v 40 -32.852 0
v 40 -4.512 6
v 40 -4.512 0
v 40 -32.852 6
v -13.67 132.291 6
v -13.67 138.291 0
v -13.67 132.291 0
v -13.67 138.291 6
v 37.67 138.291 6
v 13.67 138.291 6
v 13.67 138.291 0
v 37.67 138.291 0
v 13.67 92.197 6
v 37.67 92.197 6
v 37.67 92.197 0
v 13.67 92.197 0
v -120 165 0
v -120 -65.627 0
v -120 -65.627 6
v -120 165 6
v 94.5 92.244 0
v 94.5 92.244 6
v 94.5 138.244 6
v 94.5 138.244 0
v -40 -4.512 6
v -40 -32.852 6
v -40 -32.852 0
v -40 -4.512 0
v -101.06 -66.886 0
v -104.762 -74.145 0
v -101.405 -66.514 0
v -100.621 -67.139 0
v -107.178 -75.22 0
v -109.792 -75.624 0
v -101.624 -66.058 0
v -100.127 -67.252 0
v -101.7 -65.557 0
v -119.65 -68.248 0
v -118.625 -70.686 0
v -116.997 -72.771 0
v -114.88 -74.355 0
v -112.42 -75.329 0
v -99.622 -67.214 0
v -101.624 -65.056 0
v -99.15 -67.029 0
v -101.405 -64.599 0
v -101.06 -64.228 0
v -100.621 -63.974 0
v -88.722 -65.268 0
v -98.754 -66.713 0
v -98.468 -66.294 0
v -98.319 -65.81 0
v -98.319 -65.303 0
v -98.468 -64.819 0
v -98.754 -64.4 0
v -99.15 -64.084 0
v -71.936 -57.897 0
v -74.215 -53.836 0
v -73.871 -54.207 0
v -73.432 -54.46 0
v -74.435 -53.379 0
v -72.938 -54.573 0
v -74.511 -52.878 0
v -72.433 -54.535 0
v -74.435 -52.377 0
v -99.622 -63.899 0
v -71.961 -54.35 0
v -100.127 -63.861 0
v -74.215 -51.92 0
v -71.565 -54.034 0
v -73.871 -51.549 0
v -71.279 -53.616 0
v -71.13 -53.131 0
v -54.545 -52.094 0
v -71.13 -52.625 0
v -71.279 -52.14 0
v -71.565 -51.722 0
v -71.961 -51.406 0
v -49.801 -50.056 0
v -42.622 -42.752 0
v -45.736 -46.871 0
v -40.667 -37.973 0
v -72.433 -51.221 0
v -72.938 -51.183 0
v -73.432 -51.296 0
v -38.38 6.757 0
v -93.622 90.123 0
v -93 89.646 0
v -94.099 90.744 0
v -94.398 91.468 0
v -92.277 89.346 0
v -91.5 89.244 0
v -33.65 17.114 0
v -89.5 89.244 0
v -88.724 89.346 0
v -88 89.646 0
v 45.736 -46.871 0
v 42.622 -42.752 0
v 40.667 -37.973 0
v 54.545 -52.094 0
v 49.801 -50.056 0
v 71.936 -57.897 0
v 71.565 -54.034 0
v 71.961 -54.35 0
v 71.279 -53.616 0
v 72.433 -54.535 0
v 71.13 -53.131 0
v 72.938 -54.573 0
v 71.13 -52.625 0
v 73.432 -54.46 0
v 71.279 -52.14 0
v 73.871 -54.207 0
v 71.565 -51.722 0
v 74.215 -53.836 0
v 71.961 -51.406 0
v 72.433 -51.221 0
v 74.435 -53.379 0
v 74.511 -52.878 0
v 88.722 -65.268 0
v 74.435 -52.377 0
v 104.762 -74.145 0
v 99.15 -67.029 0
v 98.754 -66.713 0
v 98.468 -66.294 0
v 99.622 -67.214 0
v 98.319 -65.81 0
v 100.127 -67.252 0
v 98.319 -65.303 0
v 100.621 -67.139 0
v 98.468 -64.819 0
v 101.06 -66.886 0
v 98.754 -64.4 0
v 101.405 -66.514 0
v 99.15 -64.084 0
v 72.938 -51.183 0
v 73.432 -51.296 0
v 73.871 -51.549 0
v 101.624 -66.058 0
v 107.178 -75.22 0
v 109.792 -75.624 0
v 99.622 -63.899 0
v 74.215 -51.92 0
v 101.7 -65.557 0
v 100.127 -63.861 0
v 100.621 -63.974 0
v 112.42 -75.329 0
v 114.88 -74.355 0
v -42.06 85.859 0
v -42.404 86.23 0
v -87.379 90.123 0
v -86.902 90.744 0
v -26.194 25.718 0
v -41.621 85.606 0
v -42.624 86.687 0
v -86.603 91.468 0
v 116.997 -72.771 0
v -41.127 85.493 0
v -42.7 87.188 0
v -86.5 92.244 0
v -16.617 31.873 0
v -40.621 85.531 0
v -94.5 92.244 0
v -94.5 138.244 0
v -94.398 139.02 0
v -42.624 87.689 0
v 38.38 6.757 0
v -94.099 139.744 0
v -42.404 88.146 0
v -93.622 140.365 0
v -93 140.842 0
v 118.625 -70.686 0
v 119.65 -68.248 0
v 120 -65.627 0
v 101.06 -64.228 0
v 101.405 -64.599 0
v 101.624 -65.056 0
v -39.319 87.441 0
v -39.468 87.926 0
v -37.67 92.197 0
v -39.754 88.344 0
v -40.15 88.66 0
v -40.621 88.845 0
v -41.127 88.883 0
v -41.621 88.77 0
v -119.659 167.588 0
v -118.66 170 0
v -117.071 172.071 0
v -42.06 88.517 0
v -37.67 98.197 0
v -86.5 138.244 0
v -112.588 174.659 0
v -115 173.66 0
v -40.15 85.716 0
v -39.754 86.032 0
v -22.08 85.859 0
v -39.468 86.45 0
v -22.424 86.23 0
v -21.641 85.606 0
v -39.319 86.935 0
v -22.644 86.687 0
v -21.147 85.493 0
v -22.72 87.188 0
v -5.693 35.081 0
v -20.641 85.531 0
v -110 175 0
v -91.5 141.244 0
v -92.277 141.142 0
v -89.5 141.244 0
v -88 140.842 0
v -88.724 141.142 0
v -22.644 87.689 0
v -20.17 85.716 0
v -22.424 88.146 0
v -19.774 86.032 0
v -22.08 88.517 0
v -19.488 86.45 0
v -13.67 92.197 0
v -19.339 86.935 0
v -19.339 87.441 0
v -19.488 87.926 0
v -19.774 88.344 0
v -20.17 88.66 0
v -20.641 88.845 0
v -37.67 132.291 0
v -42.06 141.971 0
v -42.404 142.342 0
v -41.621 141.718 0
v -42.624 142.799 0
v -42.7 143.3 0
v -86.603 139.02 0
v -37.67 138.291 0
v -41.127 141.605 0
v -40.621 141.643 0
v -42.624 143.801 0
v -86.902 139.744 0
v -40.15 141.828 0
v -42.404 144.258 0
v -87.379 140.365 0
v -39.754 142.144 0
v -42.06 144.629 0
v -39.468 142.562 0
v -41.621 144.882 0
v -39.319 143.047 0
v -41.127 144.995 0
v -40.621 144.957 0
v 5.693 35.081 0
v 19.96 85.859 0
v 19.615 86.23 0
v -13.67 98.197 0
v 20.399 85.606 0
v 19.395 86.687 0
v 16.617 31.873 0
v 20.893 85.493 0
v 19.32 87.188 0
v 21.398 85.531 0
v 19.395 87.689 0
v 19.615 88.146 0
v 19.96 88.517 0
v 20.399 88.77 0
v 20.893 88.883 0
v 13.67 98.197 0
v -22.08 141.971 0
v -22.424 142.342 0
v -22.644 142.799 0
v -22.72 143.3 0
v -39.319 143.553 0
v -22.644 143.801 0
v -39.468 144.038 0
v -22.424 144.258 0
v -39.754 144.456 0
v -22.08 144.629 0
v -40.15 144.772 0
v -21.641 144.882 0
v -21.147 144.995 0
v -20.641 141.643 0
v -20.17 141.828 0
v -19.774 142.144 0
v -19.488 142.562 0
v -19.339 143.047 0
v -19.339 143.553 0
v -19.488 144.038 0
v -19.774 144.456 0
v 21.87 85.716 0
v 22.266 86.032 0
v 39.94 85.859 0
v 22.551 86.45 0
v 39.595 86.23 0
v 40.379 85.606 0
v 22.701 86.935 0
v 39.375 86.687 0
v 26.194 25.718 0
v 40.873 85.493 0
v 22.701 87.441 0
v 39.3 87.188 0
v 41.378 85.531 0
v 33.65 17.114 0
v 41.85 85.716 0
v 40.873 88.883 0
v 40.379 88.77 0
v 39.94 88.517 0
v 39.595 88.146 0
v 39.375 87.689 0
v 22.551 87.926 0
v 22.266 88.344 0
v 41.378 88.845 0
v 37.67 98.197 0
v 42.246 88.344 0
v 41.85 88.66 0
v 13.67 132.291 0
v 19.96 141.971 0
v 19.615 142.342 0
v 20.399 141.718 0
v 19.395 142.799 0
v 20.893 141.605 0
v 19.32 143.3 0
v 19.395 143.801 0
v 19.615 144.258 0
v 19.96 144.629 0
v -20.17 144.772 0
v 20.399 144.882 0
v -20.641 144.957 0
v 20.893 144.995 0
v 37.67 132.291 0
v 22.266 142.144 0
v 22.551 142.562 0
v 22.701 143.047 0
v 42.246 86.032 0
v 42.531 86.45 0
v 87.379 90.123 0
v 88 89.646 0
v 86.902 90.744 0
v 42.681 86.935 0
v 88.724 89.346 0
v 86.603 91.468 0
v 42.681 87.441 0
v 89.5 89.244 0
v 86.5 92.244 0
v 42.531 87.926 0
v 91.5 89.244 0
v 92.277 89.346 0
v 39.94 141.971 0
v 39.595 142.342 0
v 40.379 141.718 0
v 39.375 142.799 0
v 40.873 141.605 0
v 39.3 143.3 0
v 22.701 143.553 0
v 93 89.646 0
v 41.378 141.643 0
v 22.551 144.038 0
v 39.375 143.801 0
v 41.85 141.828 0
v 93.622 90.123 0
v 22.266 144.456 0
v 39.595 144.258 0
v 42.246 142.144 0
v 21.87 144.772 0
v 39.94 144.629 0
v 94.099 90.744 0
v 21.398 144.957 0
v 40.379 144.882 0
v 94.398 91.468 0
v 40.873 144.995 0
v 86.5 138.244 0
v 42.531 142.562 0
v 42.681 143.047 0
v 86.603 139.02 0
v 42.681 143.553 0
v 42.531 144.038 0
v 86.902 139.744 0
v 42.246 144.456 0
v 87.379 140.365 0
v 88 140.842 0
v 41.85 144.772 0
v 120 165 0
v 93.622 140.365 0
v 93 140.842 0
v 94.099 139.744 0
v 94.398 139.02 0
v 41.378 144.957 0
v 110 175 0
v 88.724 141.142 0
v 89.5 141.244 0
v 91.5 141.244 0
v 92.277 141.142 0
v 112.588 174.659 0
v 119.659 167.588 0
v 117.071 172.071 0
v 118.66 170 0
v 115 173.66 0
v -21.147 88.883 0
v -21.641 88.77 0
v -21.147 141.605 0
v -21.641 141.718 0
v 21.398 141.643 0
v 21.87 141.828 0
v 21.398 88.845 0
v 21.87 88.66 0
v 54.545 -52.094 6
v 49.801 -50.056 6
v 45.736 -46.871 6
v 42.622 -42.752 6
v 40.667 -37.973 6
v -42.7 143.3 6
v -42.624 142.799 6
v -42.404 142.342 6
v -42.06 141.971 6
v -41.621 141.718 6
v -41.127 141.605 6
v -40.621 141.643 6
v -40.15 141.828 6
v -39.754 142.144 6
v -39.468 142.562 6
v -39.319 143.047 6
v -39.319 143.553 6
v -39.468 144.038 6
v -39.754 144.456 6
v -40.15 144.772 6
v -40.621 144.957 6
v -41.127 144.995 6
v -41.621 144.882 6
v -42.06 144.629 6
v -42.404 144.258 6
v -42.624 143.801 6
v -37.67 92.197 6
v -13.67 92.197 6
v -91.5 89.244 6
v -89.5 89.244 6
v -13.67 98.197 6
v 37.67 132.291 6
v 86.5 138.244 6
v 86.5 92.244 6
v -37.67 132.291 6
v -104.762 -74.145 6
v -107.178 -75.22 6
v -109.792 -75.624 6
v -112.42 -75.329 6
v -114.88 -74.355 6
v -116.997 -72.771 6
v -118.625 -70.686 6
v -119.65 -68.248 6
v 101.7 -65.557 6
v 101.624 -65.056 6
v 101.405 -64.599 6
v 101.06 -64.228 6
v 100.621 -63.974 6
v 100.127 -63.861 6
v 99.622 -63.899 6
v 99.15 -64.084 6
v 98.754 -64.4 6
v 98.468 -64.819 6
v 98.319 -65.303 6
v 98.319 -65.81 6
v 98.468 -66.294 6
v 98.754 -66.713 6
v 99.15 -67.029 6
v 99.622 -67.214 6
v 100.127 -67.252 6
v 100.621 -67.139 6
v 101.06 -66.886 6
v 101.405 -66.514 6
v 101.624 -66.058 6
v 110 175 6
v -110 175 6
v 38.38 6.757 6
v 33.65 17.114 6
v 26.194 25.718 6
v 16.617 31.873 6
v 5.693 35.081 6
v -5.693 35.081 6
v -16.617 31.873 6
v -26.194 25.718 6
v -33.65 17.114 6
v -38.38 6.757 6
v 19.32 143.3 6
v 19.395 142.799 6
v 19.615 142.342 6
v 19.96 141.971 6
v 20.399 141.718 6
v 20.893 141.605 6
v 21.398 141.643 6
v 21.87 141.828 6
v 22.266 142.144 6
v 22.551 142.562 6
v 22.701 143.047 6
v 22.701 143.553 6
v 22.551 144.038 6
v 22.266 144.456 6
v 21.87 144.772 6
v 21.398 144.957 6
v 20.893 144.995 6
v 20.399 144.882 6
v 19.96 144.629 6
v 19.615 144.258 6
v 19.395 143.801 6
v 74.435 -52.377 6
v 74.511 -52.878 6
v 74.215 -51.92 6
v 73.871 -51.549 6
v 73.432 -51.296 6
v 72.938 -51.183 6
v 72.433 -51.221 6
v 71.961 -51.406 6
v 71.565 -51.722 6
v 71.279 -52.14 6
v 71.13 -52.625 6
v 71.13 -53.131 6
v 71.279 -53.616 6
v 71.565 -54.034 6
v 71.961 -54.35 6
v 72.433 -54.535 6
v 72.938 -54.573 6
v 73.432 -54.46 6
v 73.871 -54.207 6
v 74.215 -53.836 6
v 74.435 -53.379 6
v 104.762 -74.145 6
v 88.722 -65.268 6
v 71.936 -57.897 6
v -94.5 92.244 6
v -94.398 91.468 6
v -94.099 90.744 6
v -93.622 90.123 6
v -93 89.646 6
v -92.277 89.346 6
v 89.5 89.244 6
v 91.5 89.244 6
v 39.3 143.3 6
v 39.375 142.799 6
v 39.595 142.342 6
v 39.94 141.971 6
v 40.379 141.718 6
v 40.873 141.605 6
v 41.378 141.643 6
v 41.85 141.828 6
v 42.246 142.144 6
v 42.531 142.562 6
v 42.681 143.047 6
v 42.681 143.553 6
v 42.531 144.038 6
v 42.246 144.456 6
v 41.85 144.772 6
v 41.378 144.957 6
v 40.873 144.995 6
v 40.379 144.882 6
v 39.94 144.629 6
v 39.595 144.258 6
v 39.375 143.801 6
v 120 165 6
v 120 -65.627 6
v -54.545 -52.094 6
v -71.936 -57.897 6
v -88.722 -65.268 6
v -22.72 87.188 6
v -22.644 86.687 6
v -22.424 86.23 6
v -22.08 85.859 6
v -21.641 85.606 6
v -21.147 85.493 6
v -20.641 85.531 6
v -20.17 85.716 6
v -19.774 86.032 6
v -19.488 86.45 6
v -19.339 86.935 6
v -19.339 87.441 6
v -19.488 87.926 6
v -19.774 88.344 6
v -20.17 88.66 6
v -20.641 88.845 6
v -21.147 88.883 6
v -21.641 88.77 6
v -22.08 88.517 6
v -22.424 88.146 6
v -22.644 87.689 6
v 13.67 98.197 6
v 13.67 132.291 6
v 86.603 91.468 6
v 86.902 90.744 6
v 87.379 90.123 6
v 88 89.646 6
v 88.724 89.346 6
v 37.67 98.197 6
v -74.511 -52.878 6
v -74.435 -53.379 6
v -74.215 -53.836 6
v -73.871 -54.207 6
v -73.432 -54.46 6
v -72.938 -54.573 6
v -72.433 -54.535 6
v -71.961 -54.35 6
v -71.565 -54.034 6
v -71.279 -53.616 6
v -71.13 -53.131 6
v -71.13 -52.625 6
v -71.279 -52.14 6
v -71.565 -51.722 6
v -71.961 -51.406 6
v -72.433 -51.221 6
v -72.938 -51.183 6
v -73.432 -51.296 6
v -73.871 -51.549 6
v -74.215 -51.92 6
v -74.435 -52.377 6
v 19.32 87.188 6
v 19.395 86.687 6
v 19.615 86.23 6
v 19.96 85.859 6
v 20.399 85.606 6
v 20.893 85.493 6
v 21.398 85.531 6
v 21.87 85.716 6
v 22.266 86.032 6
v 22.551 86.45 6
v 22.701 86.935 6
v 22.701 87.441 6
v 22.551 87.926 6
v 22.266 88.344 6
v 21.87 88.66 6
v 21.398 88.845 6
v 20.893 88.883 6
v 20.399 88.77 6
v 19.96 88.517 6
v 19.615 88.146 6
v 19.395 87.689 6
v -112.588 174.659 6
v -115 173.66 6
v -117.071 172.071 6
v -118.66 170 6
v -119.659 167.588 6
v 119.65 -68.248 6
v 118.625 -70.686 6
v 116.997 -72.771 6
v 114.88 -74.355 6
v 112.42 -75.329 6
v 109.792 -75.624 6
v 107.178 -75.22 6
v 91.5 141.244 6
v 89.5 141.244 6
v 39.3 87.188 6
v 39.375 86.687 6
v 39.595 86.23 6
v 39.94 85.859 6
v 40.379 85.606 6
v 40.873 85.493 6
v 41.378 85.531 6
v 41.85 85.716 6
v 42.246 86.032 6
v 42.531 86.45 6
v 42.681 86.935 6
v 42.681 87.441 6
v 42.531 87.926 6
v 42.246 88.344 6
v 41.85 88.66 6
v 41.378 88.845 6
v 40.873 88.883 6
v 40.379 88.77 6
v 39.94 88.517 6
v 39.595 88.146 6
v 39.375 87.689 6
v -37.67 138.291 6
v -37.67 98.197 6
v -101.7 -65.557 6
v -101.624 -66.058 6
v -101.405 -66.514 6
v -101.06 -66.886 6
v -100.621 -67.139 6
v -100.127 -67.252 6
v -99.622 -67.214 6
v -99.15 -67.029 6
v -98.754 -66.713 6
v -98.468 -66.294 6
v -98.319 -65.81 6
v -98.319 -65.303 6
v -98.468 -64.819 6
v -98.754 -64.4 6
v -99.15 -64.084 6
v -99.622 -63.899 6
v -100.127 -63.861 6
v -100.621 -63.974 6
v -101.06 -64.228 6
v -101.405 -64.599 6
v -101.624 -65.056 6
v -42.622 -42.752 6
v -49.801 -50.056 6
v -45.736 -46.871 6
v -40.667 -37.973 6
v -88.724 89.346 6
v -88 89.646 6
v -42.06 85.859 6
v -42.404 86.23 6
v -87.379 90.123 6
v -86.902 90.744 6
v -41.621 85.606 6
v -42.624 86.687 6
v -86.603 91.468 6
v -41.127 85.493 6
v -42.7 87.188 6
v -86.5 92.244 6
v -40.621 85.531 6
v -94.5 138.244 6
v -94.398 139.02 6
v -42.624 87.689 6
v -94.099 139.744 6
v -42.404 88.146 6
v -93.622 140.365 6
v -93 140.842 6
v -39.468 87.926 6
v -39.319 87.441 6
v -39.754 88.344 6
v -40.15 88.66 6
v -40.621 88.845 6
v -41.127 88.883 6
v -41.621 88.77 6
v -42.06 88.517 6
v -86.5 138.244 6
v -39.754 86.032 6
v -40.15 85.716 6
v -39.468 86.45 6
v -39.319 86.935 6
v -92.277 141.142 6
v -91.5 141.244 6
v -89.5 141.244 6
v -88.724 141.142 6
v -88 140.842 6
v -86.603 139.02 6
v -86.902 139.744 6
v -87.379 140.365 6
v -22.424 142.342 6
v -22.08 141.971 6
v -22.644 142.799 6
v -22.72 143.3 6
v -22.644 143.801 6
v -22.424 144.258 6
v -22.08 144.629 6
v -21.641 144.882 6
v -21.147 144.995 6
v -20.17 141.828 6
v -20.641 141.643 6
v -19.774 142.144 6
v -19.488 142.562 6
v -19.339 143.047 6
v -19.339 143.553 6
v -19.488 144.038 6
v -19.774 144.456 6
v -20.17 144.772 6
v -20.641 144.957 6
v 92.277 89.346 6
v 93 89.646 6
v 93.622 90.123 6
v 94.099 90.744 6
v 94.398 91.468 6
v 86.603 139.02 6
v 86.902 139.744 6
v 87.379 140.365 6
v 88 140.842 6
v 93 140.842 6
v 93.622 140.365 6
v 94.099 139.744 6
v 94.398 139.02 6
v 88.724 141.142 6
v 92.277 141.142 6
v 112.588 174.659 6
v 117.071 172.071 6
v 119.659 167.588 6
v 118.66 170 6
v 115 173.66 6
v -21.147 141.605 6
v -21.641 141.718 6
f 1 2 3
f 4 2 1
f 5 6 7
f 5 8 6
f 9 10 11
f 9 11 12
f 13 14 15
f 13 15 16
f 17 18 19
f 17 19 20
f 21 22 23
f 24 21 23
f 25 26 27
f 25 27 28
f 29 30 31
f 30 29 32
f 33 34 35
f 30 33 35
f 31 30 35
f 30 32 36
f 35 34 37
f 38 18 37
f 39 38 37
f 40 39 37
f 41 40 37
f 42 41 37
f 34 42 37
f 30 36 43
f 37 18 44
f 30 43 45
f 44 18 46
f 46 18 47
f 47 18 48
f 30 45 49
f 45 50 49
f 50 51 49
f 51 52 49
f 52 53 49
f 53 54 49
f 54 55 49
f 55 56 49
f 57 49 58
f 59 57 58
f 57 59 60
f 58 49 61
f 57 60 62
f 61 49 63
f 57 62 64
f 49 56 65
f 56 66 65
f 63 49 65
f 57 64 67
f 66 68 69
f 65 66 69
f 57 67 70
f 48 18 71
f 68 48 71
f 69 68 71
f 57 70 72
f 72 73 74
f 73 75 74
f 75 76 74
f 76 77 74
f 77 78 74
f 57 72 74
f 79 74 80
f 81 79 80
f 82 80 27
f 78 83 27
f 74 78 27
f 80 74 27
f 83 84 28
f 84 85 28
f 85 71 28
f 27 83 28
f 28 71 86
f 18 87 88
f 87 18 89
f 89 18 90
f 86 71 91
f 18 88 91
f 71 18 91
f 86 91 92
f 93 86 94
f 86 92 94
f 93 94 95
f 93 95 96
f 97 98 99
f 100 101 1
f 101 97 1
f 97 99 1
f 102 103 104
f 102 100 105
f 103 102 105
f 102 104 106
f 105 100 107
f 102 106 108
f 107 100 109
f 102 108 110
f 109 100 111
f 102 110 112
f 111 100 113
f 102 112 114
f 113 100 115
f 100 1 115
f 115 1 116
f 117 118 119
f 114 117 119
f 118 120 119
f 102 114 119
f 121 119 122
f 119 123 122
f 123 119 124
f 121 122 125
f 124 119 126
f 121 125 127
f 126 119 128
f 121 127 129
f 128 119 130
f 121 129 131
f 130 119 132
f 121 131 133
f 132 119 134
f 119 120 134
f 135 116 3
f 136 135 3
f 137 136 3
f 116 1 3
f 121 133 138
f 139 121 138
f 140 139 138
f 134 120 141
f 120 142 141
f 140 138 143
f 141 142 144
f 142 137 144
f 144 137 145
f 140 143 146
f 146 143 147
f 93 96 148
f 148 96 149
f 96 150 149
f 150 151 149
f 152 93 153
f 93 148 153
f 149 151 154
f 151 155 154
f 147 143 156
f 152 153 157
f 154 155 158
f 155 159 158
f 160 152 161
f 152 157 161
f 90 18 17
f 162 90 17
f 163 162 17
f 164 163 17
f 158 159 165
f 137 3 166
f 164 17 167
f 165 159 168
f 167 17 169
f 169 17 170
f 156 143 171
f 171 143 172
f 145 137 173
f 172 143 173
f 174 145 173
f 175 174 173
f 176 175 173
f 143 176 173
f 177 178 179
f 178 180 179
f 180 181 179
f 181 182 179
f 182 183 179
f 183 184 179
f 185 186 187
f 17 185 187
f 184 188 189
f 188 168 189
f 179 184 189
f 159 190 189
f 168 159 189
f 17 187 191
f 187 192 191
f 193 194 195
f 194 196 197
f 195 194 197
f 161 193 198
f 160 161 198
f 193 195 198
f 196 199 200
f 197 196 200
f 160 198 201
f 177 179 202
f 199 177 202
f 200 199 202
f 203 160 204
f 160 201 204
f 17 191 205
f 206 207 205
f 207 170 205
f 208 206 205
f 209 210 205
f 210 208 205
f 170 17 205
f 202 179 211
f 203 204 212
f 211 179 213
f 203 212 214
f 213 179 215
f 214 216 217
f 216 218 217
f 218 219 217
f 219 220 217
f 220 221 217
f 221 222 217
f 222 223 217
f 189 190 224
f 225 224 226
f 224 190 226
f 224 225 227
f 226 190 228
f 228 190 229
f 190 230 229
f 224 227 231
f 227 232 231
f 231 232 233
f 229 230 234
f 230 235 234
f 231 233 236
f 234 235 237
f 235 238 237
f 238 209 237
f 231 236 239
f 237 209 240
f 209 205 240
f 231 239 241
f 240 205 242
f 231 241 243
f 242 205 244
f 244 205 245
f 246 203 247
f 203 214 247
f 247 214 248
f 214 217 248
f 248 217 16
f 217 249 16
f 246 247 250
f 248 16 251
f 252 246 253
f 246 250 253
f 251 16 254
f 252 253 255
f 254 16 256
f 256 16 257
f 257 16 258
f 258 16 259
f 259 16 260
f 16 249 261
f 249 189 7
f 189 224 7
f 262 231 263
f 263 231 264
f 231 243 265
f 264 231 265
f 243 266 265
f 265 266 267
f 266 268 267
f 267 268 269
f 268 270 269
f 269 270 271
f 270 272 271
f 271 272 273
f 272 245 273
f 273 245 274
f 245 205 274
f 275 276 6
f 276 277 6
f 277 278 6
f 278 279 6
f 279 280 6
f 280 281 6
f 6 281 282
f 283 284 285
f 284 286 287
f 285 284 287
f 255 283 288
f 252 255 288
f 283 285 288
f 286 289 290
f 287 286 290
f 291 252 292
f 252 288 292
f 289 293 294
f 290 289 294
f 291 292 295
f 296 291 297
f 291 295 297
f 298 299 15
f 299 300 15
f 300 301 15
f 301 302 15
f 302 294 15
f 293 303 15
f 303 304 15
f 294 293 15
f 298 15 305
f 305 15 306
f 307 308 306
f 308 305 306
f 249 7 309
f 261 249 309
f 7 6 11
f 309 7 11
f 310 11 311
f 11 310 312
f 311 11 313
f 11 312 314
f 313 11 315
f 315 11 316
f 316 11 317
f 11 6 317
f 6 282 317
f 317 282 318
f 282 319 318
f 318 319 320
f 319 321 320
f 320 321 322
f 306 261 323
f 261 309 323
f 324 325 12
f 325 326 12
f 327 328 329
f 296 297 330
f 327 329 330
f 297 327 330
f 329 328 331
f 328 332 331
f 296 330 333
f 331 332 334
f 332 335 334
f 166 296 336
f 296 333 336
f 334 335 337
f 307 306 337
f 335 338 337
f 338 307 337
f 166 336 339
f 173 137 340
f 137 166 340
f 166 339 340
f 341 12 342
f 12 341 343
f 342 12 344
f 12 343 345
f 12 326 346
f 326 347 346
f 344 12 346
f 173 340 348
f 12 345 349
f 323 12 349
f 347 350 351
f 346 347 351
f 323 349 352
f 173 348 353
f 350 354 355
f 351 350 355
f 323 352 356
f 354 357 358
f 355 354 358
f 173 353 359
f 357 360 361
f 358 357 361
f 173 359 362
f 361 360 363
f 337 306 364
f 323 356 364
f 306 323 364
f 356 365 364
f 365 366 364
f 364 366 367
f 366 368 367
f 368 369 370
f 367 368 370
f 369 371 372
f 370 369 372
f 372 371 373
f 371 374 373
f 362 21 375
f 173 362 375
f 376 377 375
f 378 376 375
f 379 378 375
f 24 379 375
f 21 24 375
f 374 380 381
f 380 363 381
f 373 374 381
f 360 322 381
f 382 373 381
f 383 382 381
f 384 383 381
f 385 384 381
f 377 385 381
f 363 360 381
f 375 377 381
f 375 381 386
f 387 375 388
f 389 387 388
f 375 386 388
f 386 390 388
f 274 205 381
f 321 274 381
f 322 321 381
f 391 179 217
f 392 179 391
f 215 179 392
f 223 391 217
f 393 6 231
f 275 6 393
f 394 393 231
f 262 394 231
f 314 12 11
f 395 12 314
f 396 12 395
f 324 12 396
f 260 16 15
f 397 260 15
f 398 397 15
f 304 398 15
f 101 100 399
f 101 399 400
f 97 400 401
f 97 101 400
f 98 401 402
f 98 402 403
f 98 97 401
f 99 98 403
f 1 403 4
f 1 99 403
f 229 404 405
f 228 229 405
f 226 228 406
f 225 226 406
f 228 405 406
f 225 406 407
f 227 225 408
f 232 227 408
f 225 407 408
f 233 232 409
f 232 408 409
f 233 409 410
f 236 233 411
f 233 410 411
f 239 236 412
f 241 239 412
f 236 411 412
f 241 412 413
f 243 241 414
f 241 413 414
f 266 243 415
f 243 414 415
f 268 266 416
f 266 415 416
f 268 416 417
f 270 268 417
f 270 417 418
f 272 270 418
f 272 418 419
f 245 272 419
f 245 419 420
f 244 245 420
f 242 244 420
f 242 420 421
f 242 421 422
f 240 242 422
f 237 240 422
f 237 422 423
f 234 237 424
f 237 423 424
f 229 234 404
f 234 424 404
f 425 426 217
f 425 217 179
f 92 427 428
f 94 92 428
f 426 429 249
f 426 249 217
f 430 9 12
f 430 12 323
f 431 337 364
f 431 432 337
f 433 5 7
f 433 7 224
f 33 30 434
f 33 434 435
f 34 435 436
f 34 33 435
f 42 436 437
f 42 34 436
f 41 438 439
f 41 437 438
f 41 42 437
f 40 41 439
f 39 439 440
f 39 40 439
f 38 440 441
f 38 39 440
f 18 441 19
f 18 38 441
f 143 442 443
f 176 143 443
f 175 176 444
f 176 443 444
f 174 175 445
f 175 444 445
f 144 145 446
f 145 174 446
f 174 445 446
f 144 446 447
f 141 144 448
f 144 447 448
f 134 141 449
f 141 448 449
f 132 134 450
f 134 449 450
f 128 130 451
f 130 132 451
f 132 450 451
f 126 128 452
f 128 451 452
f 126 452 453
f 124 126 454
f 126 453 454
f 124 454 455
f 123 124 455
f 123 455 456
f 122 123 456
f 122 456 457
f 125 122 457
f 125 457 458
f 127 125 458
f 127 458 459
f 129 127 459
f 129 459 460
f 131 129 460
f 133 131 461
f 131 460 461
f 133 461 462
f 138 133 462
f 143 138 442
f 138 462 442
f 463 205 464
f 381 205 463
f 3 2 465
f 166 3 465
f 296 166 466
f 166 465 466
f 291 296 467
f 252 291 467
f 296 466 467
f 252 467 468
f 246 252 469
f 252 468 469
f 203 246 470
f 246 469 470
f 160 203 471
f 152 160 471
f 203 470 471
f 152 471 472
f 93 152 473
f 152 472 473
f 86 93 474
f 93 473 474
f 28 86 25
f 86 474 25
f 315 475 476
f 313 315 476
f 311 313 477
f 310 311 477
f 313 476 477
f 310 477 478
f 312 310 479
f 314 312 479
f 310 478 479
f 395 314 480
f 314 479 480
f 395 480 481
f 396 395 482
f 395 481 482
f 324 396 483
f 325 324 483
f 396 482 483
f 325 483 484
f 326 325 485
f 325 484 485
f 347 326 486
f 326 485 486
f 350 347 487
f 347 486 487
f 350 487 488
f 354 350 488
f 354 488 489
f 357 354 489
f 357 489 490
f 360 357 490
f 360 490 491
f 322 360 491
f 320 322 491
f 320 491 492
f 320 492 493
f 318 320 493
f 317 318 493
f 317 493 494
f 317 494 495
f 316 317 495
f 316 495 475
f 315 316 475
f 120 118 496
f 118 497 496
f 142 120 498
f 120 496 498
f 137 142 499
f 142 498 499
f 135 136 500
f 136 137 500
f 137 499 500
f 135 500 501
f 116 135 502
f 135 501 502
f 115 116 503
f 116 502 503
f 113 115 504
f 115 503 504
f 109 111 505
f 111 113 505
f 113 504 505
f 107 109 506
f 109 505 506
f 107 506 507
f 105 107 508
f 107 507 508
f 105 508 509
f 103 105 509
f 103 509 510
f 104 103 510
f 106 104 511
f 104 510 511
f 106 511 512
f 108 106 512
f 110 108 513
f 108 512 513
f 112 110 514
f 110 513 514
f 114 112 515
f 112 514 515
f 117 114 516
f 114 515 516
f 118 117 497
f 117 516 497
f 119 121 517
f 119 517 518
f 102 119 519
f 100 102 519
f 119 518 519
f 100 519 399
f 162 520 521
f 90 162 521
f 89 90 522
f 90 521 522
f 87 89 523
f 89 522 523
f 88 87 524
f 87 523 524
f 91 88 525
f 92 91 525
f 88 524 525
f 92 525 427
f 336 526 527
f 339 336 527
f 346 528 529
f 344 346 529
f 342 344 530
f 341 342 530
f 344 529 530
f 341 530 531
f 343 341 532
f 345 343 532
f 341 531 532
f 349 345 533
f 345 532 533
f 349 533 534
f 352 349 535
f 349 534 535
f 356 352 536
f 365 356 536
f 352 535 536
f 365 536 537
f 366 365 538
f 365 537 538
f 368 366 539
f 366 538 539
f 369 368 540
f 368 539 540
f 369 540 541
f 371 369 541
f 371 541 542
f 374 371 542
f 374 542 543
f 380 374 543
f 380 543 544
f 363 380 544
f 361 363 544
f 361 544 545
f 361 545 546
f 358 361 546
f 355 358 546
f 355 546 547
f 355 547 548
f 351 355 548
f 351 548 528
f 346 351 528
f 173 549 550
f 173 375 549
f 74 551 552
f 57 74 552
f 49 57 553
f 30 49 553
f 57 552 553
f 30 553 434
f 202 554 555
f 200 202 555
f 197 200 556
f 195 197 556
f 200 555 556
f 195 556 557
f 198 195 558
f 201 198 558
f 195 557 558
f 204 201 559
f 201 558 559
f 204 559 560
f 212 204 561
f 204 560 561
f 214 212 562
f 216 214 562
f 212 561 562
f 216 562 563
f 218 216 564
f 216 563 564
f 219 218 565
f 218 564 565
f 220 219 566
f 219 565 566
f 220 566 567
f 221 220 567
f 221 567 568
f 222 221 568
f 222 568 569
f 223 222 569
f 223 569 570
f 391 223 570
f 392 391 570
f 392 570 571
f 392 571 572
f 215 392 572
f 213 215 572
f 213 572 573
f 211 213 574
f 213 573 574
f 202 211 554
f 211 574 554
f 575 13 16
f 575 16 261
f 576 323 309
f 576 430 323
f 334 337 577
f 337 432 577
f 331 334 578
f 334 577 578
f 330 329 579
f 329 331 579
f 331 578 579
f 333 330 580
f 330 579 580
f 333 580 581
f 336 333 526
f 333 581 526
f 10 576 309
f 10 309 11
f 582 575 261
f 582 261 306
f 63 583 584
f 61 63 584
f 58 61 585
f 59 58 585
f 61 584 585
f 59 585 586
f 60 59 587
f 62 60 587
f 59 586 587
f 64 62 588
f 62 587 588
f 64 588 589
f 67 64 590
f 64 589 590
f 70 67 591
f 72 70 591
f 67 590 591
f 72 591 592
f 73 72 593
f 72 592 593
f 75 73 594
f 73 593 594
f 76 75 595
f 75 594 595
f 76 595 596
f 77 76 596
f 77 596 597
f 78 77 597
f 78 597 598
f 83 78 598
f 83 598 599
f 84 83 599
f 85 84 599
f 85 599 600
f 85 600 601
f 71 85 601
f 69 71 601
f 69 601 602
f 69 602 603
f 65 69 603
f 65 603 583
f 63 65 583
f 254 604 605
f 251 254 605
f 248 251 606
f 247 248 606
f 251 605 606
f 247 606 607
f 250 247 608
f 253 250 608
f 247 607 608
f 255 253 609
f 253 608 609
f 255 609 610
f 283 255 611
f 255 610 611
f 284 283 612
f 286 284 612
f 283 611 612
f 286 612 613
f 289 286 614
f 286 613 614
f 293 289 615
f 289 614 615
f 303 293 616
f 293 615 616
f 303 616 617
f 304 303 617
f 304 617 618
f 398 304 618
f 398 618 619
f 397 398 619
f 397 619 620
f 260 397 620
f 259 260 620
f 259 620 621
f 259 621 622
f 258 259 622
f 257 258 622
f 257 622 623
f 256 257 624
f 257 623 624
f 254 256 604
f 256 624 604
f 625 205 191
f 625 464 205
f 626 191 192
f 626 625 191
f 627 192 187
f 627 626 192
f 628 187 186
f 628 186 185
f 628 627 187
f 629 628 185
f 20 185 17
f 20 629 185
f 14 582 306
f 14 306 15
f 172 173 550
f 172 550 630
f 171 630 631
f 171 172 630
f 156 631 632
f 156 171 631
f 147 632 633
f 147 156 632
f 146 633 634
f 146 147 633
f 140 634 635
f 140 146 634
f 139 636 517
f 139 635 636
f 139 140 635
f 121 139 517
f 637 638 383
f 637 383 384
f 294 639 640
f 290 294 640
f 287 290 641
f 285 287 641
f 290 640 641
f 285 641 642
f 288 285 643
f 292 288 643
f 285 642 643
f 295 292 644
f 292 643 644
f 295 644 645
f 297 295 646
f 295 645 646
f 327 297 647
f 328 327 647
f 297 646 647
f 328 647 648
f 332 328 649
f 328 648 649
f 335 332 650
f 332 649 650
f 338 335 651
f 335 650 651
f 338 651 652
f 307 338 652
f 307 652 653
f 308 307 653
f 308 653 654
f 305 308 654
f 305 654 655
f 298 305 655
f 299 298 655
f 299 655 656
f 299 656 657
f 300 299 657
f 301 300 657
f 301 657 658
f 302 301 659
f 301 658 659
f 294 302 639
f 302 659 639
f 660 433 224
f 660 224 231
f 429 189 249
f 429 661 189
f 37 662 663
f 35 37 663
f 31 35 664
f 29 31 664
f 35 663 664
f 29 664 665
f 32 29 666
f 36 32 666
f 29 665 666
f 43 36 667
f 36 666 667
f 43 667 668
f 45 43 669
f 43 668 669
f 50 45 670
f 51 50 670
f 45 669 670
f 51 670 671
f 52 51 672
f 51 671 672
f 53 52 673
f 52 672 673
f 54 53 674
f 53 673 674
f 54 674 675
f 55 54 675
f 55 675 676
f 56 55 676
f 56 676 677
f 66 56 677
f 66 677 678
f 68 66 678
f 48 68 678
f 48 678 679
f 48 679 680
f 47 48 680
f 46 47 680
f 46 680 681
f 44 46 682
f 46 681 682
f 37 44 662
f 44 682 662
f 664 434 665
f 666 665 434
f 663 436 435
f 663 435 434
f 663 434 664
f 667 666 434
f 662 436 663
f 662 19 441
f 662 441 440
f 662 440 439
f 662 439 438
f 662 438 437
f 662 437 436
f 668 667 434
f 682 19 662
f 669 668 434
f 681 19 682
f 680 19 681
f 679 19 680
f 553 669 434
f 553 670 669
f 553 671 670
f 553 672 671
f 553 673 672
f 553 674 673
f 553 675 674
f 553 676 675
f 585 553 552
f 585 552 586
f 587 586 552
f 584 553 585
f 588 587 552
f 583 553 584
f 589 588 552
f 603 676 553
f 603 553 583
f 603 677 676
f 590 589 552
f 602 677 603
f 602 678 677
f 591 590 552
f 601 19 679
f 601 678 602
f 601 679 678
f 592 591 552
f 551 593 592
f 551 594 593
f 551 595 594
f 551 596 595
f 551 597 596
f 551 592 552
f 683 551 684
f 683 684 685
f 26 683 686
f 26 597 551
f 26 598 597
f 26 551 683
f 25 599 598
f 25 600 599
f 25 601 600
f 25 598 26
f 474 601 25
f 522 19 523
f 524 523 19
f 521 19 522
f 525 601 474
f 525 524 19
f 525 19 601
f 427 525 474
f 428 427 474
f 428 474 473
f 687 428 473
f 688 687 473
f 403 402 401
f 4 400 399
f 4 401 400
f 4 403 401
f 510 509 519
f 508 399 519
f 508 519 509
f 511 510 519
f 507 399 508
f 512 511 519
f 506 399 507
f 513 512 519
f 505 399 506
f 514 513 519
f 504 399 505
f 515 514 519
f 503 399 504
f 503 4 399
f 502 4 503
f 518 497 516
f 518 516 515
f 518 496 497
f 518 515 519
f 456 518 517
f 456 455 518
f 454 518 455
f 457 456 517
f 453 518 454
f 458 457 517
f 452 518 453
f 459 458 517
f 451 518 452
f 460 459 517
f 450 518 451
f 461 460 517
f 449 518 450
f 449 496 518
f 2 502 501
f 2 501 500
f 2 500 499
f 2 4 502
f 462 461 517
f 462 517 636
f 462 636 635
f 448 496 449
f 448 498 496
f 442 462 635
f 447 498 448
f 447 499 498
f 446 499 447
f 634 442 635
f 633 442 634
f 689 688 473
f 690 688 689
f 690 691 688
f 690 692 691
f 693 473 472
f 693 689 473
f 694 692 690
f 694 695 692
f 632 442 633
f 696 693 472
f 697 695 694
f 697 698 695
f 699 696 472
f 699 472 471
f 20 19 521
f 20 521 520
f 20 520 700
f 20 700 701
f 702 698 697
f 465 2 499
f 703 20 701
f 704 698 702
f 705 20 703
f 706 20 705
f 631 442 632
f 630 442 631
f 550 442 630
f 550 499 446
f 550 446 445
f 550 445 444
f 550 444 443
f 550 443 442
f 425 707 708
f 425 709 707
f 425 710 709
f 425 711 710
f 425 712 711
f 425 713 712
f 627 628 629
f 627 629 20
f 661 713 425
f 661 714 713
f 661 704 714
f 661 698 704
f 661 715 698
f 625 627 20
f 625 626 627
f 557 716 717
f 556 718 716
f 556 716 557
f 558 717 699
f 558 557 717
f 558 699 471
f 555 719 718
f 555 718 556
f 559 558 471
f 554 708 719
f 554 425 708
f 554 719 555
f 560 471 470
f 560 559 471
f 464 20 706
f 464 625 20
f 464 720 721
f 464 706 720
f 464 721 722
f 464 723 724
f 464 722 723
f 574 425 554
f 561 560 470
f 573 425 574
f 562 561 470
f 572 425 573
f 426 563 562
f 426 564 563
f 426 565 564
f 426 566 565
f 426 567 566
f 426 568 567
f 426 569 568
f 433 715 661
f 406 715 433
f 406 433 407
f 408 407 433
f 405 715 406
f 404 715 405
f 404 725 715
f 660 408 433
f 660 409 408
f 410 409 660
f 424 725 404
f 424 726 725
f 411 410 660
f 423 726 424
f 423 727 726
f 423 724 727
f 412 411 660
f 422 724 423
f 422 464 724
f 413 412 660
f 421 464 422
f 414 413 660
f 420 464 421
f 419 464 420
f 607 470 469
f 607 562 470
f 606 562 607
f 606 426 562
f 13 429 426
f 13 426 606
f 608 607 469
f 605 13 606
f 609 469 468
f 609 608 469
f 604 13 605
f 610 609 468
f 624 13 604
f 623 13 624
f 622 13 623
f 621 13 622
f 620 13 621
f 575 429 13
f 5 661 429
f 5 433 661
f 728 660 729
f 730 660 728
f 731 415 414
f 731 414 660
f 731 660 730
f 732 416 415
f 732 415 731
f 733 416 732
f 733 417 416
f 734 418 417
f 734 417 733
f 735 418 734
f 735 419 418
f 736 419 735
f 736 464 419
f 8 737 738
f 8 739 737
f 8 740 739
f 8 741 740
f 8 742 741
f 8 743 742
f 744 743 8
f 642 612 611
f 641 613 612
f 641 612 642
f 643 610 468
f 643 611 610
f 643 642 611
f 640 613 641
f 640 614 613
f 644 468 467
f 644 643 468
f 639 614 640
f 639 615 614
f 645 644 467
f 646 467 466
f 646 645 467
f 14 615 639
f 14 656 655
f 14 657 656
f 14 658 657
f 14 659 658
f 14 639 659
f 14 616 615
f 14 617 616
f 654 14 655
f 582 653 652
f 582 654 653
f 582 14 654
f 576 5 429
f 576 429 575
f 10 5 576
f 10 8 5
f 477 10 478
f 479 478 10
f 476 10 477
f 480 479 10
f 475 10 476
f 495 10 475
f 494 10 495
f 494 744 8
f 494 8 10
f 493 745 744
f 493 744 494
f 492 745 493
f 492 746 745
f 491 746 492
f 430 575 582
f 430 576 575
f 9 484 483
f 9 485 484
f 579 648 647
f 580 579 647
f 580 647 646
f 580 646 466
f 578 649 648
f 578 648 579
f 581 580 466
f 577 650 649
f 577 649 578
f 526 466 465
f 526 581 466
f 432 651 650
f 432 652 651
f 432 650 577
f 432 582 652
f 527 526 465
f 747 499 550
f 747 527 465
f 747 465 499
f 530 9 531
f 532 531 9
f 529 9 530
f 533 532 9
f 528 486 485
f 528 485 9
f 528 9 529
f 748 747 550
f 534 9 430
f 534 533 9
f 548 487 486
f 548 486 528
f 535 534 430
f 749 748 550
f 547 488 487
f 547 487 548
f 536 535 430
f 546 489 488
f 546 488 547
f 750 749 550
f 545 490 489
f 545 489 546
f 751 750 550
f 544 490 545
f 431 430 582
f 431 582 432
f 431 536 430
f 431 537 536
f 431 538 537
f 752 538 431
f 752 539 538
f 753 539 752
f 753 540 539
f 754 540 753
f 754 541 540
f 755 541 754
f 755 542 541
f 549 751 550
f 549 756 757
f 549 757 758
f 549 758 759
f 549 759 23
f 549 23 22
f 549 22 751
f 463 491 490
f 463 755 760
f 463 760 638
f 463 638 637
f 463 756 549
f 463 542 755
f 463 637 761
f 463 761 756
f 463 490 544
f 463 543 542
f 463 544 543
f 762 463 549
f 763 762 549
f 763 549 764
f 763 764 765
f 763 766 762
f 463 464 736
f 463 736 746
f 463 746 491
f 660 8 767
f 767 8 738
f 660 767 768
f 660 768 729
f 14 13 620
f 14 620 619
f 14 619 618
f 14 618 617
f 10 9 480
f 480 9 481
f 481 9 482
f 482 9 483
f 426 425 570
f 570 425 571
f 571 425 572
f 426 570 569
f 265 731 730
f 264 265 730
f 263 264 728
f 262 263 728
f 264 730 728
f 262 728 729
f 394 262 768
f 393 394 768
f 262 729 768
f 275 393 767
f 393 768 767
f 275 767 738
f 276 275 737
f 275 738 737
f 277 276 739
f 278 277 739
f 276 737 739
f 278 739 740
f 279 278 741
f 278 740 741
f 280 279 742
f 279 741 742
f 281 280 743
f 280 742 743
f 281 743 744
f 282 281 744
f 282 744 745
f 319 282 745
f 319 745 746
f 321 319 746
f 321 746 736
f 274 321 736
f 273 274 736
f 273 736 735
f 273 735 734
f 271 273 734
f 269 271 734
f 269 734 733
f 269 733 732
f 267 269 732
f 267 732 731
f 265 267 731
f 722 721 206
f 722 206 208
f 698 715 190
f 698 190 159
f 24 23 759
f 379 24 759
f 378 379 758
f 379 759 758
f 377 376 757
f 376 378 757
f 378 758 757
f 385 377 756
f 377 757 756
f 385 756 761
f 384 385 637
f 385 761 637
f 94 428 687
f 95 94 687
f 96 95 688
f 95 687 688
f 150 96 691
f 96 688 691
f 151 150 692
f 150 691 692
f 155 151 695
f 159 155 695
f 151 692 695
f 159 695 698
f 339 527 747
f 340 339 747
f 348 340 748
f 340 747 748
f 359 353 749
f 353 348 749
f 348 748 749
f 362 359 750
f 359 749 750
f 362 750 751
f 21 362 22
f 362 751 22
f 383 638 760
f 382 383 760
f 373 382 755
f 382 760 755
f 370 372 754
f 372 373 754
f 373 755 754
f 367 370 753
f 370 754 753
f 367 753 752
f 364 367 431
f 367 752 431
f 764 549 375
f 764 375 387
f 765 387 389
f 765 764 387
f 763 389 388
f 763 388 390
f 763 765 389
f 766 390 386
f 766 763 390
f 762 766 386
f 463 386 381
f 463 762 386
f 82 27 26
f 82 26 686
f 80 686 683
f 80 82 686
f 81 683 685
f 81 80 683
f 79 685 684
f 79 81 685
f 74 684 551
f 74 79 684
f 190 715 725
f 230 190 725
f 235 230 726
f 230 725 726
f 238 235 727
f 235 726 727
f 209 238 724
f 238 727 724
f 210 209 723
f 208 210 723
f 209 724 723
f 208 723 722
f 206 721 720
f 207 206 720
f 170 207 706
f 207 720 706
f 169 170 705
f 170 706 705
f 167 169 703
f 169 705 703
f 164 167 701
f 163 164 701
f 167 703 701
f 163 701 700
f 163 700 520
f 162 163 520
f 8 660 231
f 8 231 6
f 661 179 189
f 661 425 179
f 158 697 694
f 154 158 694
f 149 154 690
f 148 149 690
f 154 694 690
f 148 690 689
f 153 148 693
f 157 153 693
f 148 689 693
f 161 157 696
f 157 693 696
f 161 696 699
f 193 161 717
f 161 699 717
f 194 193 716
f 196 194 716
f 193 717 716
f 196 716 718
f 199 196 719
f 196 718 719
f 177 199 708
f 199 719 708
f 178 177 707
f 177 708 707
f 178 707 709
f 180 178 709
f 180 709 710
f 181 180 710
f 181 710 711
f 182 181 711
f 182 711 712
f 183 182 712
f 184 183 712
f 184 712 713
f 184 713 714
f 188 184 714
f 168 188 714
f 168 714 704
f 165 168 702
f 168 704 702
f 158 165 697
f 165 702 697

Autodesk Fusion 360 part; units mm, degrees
sketch "Sketch1" plane through (0, 0, 0) normal (0, 0, 1) x (1, 0, 0)
  line L0 (-120, 175) -> (120, 175)
  line L1 (120, 175) -> (120, -175)
  line L2 (120, -175) -> (-120, -175)
  line L3 (-120, -175) -> (-120, 175)
  line L4 (-120, 175) -> (120, -175) construction
  line L5 (120, 175) -> (-120, -175) construction
  dimension "d1" = 240
  dimension "d2" = 350
extrude "Extrude1" add sketch "Sketch1" along normal blind 6
sketch "Sketch2" plane through (0, 0, 6) normal (0, 0, 1) x (-1, 0, 0)
  line L0 (120, 175) -> (-120, 175)
  line L1 (-120, 175) -> (-120, -175)
  line L2 (-120, -175) -> (120, -175)
  line L3 (120, -175) -> (120, 175)
  line L4 (0, -2.5) -> (0, -20)
  line L5 (37.6695, -98.197) -> (13.6695, -98.197)
  line L6 (13.6695, -98.197) -> (13.6695, -92.197)
  line L7 (13.6695, -92.197) -> (37.6695, -92.197)
  line L8 (37.6695, -92.197) -> (37.6695, -98.197)
  line L9 (-13.6695, -98.197) -> (-37.6695, -98.197)
  line L10 (-37.6695, -98.197) -> (-37.6695, -92.197)
  line L11 (-37.6695, -92.197) -> (-13.6695, -92.197)
  line L12 (-13.6695, -92.197) -> (-13.6695, -98.197)
  line L13 (13.6695, -98.197) -> (-13.6695, -98.197) construction
  line L14 (13.6695, -92.197) -> (0, 0) construction
  line L15 (0, 0) -> (-13.6695, -92.197) construction
  line L16 (37.6695, -138.291) -> (13.6695, -138.291)
  line L17 (13.6695, -138.291) -> (13.6695, -132.291)
  line L18 (13.6695, -132.291) -> (37.6695, -132.291)
  line L19 (37.6695, -132.291) -> (37.6695, -138.291)
  line L20 (-13.6695, -138.291) -> (-37.6695, -138.291)
  line L21 (-37.6695, -138.291) -> (-37.6695, -132.291)
  line L22 (-37.6695, -132.291) -> (-13.6695, -132.291)
  line L23 (-13.6695, -132.291) -> (-13.6695, -138.291)
  line L24 (13.6695, -132.291) -> (13.6695, -98.197) construction
  line L25 (-13.6695, -132.291) -> (-13.6695, -98.197) construction
  line L26 (13.6695, -132.291) -> (-13.6695, -132.291) construction
  circle A0 centre (40.9997, -143.3) radius 1.7
  circle A1 centre (21.0197, -143.3) radius 1.7
  line L27 (40.9997, -143.3) -> (21.0197, -143.3) construction
  circle A2 centre (40.9997, -87.188) radius 1.7
  circle A3 centre (21.0197, -87.188) radius 1.7
  line L28 (40.9997, -87.188) -> (21.0197, -87.188) construction
  line L29 (37.6695, -92.197) -> (40.0585, -88.6037) construction
  line L30 (40.9997, -87.188) -> (40.0585, -88.6037) construction
  line L31 (21.0197, -87.188) -> (21.0197, -88.888) construction
  line L32 (21.0197, -92.197) -> (21.0197, -88.888) construction
  line L33 (40.9997, -143.3) -> (40.0585, -141.8843) construction
  line L34 (40.0585, -141.8843) -> (37.6695, -138.291) construction
  line L35 (21.0197, -143.3) -> (21.0197, -141.6) construction
  line L36 (21.0197, -141.6) -> (21.0197, -138.291) construction
  circle A4 centre (-21.0197, -143.3) radius 1.7
  circle A5 centre (-40.9997, -143.3) radius 1.7
  line L37 (-21.0197, -143.3) -> (-40.9997, -143.3) construction
  line L38 (-21.0197, -143.3) -> (-21.0197, -141.6) construction
  line L39 (-21.0197, -138.291) -> (-21.0197, -141.6) construction
  line L40 (-40.9997, -143.3) -> (-40.0585, -141.8843) construction
  line L41 (-37.6695, -138.291) -> (-40.0585, -141.8843) construction
  circle A6 centre (-21.0197, -87.188) radius 1.7
  circle A7 centre (-40.9997, -87.188) radius 1.7
  line L42 (-21.0197, -87.188) -> (-40.9997, -87.188) construction
  line L43 (-40.9997, -87.188) -> (-40.0585, -88.6037) construction
  line L44 (-37.6695, -92.197) -> (-40.0585, -88.6037) construction
  line L45 (-21.0197, -87.188) -> (-21.0197, -88.888) construction
  line L46 (-21.0197, -92.197) -> (-21.0197, -88.888) construction
  dimension "d5" = 24
  dimension "d6" = 6
  dimension "d7" = 27.339
  dimension "d8" = 34.094
  dimension "d11" = 3.4
  dimension "d12" = 19.98
  dimension "d13" = 4.315
  dimension "d14" = 3.309
  dimension "d15" = 30
extrude "Extrude2" cut sketch "Sketch2" against normal up to surface (6 mm away) contours L5 L6 L7 L8 | L9 L10 L11 L12 | L16 L17 L18 L19 | L20 L21 L22 L23 | A0 | A1 | A2 | A3 | A4 | A5 | A6 | A7
sketch "Sketch4" plane through (0, 0, 6) normal (0, 0, 1) x (-1, 0, 0)
  circle A0 centre (-40.9997, -87.188) radius 1.7
  line L0 (37.6695, -132.291) -> (37.6695, -138.291)
  line L1 (37.6695, -138.291) -> (13.6695, -138.291)
  line L2 (13.6695, -138.291) -> (13.6695, -132.291)
  line L3 (13.6695, -132.291) -> (37.6695, -132.291)
  circle A1 centre (21.0197, -87.188) radius 1.7
  circle A2 centre (40.9997, -87.188) radius 1.7
  circle A3 centre (21.0197, -143.3) radius 1.7
  circle A4 centre (-40.9997, -143.3) radius 1.7
  circle A5 centre (-21.0197, -87.188) radius 1.7
  line L4 (-13.6695, -132.291) -> (-13.6695, -138.291)
  line L5 (-13.6695, -138.291) -> (-37.6695, -138.291)
  line L6 (-37.6695, -138.291) -> (-37.6695, -132.291)
  line L7 (-37.6695, -132.291) -> (-13.6695, -132.291)
  line L8 (37.6695, -92.197) -> (37.6695, -98.197)
  line L9 (37.6695, -98.197) -> (13.6695, -98.197)
  line L10 (13.6695, -98.197) -> (13.6695, -92.197)
  line L11 (13.6695, -92.197) -> (37.6695, -92.197)
  line L12 (-13.6695, -92.197) -> (-13.6695, -98.197)
  line L13 (-13.6695, -98.197) -> (-37.6695, -98.197)
  line L14 (-37.6695, -98.197) -> (-37.6695, -92.197)
  line L15 (-37.6695, -92.197) -> (-13.6695, -92.197)
  circle A6 centre (40.9997, -143.3) radius 1.7
  circle A7 centre (-21.0197, -143.3) radius 1.7
  line L16 (120, 175) -> (-120, 175)
  line L17 (-120, 175) -> (-120, -175)
  line L18 (-120, -175) -> (120, -175)
  line L19 (120, -175) -> (120, 175)
  line L20 (94.5005, -138.244) -> (94.5005, -92.244)
  line L21 (91.5005, -89.244) -> (89.5005, -89.244)
  line L22 (86.5005, -138.244) -> (86.5005, -92.244)
  line L23 (91.5005, -141.244) -> (89.5005, -141.244)
  arc A8 (91.5005, -141.244) -> (94.5005, -138.244) centre (91.5005, -138.244) ccw
  arc A9 (94.5005, -138.244) -> (91.5005, -141.244) centre (91.5005, -138.244) ccw construction
  arc A10 (86.5005, -138.244) -> (89.5005, -141.244) centre (89.5005, -138.244) ccw
  arc A11 (89.5005, -141.244) -> (86.5005, -138.244) centre (89.5005, -138.244) ccw construction
  arc A12 (89.5005, -89.244) -> (86.5005, -92.244) centre (89.5005, -92.244) ccw
  arc A13 (86.5005, -92.244) -> (89.5005, -89.244) centre (89.5005, -92.244) ccw construction
  arc A14 (94.5005, -92.244) -> (91.5005, -89.244) centre (91.5005, -92.244) ccw
  arc A15 (91.5005, -89.244) -> (94.5005, -92.244) centre (91.5005, -92.244) ccw construction
  line L24 (89.5005, -92.244) -> (40.9997, -87.188) construction
  line L25 (89.5005, -138.244) -> (40.9997, -143.3) construction
  dimension "d22" = 3
  dimension "d23" = 2
  dimension "d24" = 46
  dimension "d25" = 48.831
extrude "Extrude3" cut sketch "Sketch4" against normal up to surface (6 mm away) contours L20 L21 L22 L23 A8 A10 A12 A14
mirror "Mirror1" about plane through (0, 0, 0) normal (1, 0, 0) of "Extrude3"
sketch "Sketch5" plane through (0, 0, 6) normal (0, 0, 1) x (-1, 0, 0)
  line L0 (-91.5005, -89.244) -> (-89.5005, -89.244)
  arc A0 (-86.5005, -92.244) -> (-89.5005, -89.244) centre (-89.5005, -92.244) ccw
  line L1 (-86.5005, -92.244) -> (-86.5005, -138.244)
  arc A1 (-89.5005, -141.244) -> (-86.5005, -138.244) centre (-89.5005, -138.244) ccw
  line L2 (-89.5005, -141.244) -> (-91.5005, -141.244)
  arc A2 (-94.5005, -138.244) -> (-91.5005, -141.244) centre (-91.5005, -138.244) ccw
  line L3 (-94.5005, -138.244) -> (-94.5005, -92.244)
  arc A3 (-91.5005, -89.244) -> (-94.5005, -92.244) centre (-91.5005, -92.244) ccw
  line L4 (86.5005, -138.244) -> (86.5005, -92.244)
  arc A4 (89.5005, -89.244) -> (86.5005, -92.244) centre (89.5005, -92.244) ccw
  line L5 (89.5005, -89.244) -> (91.5005, -89.244)
  arc A5 (94.5005, -92.244) -> (91.5005, -89.244) centre (91.5005, -92.244) ccw
  line L6 (94.5005, -92.244) -> (94.5005, -138.244)
  arc A6 (91.5005, -141.244) -> (94.5005, -138.244) centre (91.5005, -138.244) ccw
  line L7 (91.5005, -141.244) -> (89.5005, -141.244)
  arc A7 (86.5005, -138.244) -> (89.5005, -141.244) centre (89.5005, -138.244) ccw
  circle A8 centre (-40.9997, -87.188) radius 1.7
  line L8 (37.6695, -132.291) -> (37.6695, -138.291)
  line L9 (37.6695, -138.291) -> (13.6695, -138.291)
  line L10 (13.6695, -138.291) -> (13.6695, -132.291)
  line L11 (13.6695, -132.291) -> (37.6695, -132.291)
  circle A9 centre (21.0197, -87.188) radius 1.7
  circle A10 centre (40.9997, -87.188) radius 1.7
  circle A11 centre (21.0197, -143.3) radius 1.7
  circle A12 centre (-40.9997, -143.3) radius 1.7
  circle A13 centre (-21.0197, -87.188) radius 1.7
  line L12 (-13.6695, -132.291) -> (-13.6695, -138.291)
  line L13 (-13.6695, -138.291) -> (-37.6695, -138.291)
  line L14 (-37.6695, -138.291) -> (-37.6695, -132.291)
  line L15 (-37.6695, -132.291) -> (-13.6695, -132.291)
  line L16 (37.6695, -92.197) -> (37.6695, -98.197)
  line L17 (37.6695, -98.197) -> (13.6695, -98.197)
  line L18 (13.6695, -98.197) -> (13.6695, -92.197)
  line L19 (13.6695, -92.197) -> (37.6695, -92.197)
  line L20 (-13.6695, -92.197) -> (-13.6695, -98.197)
  line L21 (-13.6695, -98.197) -> (-37.6695, -98.197)
  line L22 (-37.6695, -98.197) -> (-37.6695, -92.197)
  line L23 (-37.6695, -92.197) -> (-13.6695, -92.197)
  circle A14 centre (40.9997, -143.3) radius 1.7
  circle A15 centre (-21.0197, -143.3) radius 1.7
  line L24 (120, 175) -> (-120, 175)
  line L25 (-120, 175) -> (-120, -175)
  line L26 (-120, -175) -> (120, -175)
  line L27 (120, -175) -> (120, 175)
  line L28 (0, -2.5) -> (0, -20)
  circle A16 centre (0, 4.512) radius 40
  line L29 (21.0197, -85.488) -> (-21.0197, -85.488) construction
  dimension "d30" = 80
  dimension "d31" = 50
extrude "Extrude4" cut sketch "Sketch5" against normal up to surface (6 mm away) contours A16
sketch "Sketch6" plane through (0, 0, 6) normal (0, 0, 1) x (-1, 0, 0)
  circle A0 centre (0, 4.512) radius 40 construction
  line L0 (-91.5005, -89.244) -> (-89.5005, -89.244)
  arc A1 (-86.5005, -92.244) -> (-89.5005, -89.244) centre (-89.5005, -92.244) ccw
  line L1 (-86.5005, -92.244) -> (-86.5005, -138.244)
  arc A2 (-89.5005, -141.244) -> (-86.5005, -138.244) centre (-89.5005, -138.244) ccw
  line L2 (-89.5005, -141.244) -> (-91.5005, -141.244)
  arc A3 (-94.5005, -138.244) -> (-91.5005, -141.244) centre (-91.5005, -138.244) ccw
  line L3 (-94.5005, -138.244) -> (-94.5005, -92.244)
  arc A4 (-91.5005, -89.244) -> (-94.5005, -92.244) centre (-91.5005, -92.244) ccw
  line L4 (86.5005, -138.244) -> (86.5005, -92.244)
  arc A5 (89.5005, -89.244) -> (86.5005, -92.244) centre (89.5005, -92.244) ccw
  line L5 (89.5005, -89.244) -> (91.5005, -89.244)
  arc A6 (94.5005, -92.244) -> (91.5005, -89.244) centre (91.5005, -92.244) ccw
  line L6 (94.5005, -92.244) -> (94.5005, -138.244)
  arc A7 (91.5005, -141.244) -> (94.5005, -138.244) centre (91.5005, -138.244) ccw
  line L7 (91.5005, -141.244) -> (89.5005, -141.244)
  arc A8 (86.5005, -138.244) -> (89.5005, -141.244) centre (89.5005, -138.244) ccw
  circle A9 centre (-40.9997, -87.188) radius 1.7
  line L8 (37.6695, -132.291) -> (37.6695, -138.291)
  line L9 (37.6695, -138.291) -> (13.6695, -138.291)
  line L10 (13.6695, -138.291) -> (13.6695, -132.291)
  line L11 (13.6695, -132.291) -> (37.6695, -132.291)
  circle A10 centre (21.0197, -87.188) radius 1.7
  circle A11 centre (40.9997, -87.188) radius 1.7
  circle A12 centre (21.0197, -143.3) radius 1.7
  circle A13 centre (-40.9997, -143.3) radius 1.7
  circle A14 centre (-21.0197, -87.188) radius 1.7
  line L12 (-13.6695, -132.291) -> (-13.6695, -138.291)
  line L13 (-13.6695, -138.291) -> (-37.6695, -138.291)
  line L14 (-37.6695, -138.291) -> (-37.6695, -132.291)
  line L15 (-37.6695, -132.291) -> (-13.6695, -132.291)
  line L16 (37.6695, -92.197) -> (37.6695, -98.197)
  line L17 (37.6695, -98.197) -> (13.6695, -98.197)
  line L18 (13.6695, -98.197) -> (13.6695, -92.197)
  line L19 (13.6695, -92.197) -> (37.6695, -92.197)
  line L20 (-13.6695, -92.197) -> (-13.6695, -98.197)
  line L21 (-13.6695, -98.197) -> (-37.6695, -98.197)
  line L22 (-37.6695, -98.197) -> (-37.6695, -92.197)
  line L23 (-37.6695, -92.197) -> (-13.6695, -92.197)
  circle A15 centre (40.9997, -143.3) radius 1.7
  circle A16 centre (-21.0197, -143.3) radius 1.7
  line L24 (120, 175) -> (-120, 175)
  line L25 (-120, 175) -> (-120, -175)
  line L26 (-120, -175) -> (120, -175)
  line L27 (120, -175) -> (120, 175)
  circle A17 centre (0, 244.512) radius 200
  circle A18 centre (0, 4.512) radius 40 construction
  line L28 (0, 244.512) -> (0, 4.512) construction
  line L29 (40, 48.5528) -> (40, 4.512)
  line L30 (40, 4.512) -> (-40, 4.512)
  line L31 (-40, 4.512) -> (-40, 48.5528)
  dimension "d34" = 400
  dimension "d40" = 80
extrude "Extrude5" cut sketch "Sketch6" against normal up to surface (6 mm away) contours L24 L25 L27 A17 | A17 L29 L30 L31 picked at (-4.4713, 131.6541)
fillet "Fillet1" radius 20 2 edges at (-40, -48.5528, 3) (40, -48.5528, 3)
sketch "Sketch8" plane through (0, 0, 6) normal (0, 0, 1) x (-1, 0, 0)
  arc A0 (-40, 32.8519) -> (-54.5455, 52.0937) centre (-60, 32.8519) ccw
  arc A1 (-120, 84.512) -> (-54.5455, 52.0937) centre (0, 244.512) ccw
  line L0 (-120, 84.512) -> (-120, -175)
  line L1 (-120, -175) -> (120, -175)
  line L2 (120, -175) -> (120, 84.512)
  arc A2 (54.5455, 52.0937) -> (120, 84.512) centre (0, 244.512) ccw
  arc A3 (54.5455, 52.0937) -> (40, 32.8519) centre (60, 32.8519) ccw
  line L3 (40, 32.8519) -> (40, 4.512)
  arc A4 (-40, 4.512) -> (40, 4.512) centre (0, 4.512) ccw
  line L4 (-40, 4.512) -> (-40, 32.8519)
  line L5 (-91.5005, -89.244) -> (-89.5005, -89.244)
  arc A5 (-86.5005, -92.244) -> (-89.5005, -89.244) centre (-89.5005, -92.244) ccw
  line L6 (-86.5005, -92.244) -> (-86.5005, -138.244)
  arc A6 (-89.5005, -141.244) -> (-86.5005, -138.244) centre (-89.5005, -138.244) ccw
  line L7 (-89.5005, -141.244) -> (-91.5005, -141.244)
  arc A7 (-94.5005, -138.244) -> (-91.5005, -141.244) centre (-91.5005, -138.244) ccw
  line L8 (-94.5005, -138.244) -> (-94.5005, -92.244)
  arc A8 (-91.5005, -89.244) -> (-94.5005, -92.244) centre (-91.5005, -92.244) ccw
  line L9 (86.5005, -138.244) -> (86.5005, -92.244)
  arc A9 (89.5005, -89.244) -> (86.5005, -92.244) centre (89.5005, -92.244) ccw
  line L10 (89.5005, -89.244) -> (91.5005, -89.244)
  arc A10 (94.5005, -92.244) -> (91.5005, -89.244) centre (91.5005, -92.244) ccw
  line L11 (94.5005, -92.244) -> (94.5005, -138.244)
  arc A11 (91.5005, -141.244) -> (94.5005, -138.244) centre (91.5005, -138.244) ccw
  line L12 (91.5005, -141.244) -> (89.5005, -141.244)
  arc A12 (86.5005, -138.244) -> (89.5005, -141.244) centre (89.5005, -138.244) ccw
  circle A13 centre (-40.9997, -87.188) radius 1.7
  line L13 (37.6695, -132.291) -> (37.6695, -138.291)
  line L14 (37.6695, -138.291) -> (13.6695, -138.291)
  line L15 (13.6695, -138.291) -> (13.6695, -132.291)
  line L16 (13.6695, -132.291) -> (37.6695, -132.291)
  circle A14 centre (21.0197, -87.188) radius 1.7
  circle A15 centre (40.9997, -87.188) radius 1.7
  circle A16 centre (21.0197, -143.3) radius 1.7
  circle A17 centre (-40.9997, -143.3) radius 1.7
  circle A18 centre (-21.0197, -87.188) radius 1.7
  line L17 (-13.6695, -132.291) -> (-13.6695, -138.291)
  line L18 (-13.6695, -138.291) -> (-37.6695, -138.291)
  line L19 (-37.6695, -138.291) -> (-37.6695, -132.291)
  line L20 (-37.6695, -132.291) -> (-13.6695, -132.291)
  line L21 (37.6695, -92.197) -> (37.6695, -98.197)
  line L22 (37.6695, -98.197) -> (13.6695, -98.197)
  line L23 (13.6695, -98.197) -> (13.6695, -92.197)
  line L24 (13.6695, -92.197) -> (37.6695, -92.197)
  line L25 (-13.6695, -92.197) -> (-13.6695, -98.197)
  line L26 (-13.6695, -98.197) -> (-37.6695, -98.197)
  line L27 (-37.6695, -98.197) -> (-37.6695, -92.197)
  line L28 (-37.6695, -92.197) -> (-13.6695, -92.197)
  circle A19 centre (40.9997, -143.3) radius 1.7
  circle A20 centre (-21.0197, -143.3) radius 1.7
  arc A21 (55.9091, 47.2833) -> (123, 80.512) centre (0, 244.512) ccw construction
  circle A22 centre (100, 65.5567) radius 1.7
  circle A23 centre (72.8108, 52.878) radius 1.7
  dimension "d45" = 5
  dimension "d46" = 3.4
  dimension "d47" = 30
  dimension "d48" = 20
extrude "Extrude7" cut sketch "Sketch8" against normal up to surface (6 mm away) contours A22 | A23
mirror "Mirror2" about plane through (0, 0, 0) normal (1, 0, 0) of "Extrude7"
fillet "Fillet2" radius 10 4 edges at (120, -84.512, 3) (120, 175, 3) (-120, 175, 3) (-120, -84.512, 3)
